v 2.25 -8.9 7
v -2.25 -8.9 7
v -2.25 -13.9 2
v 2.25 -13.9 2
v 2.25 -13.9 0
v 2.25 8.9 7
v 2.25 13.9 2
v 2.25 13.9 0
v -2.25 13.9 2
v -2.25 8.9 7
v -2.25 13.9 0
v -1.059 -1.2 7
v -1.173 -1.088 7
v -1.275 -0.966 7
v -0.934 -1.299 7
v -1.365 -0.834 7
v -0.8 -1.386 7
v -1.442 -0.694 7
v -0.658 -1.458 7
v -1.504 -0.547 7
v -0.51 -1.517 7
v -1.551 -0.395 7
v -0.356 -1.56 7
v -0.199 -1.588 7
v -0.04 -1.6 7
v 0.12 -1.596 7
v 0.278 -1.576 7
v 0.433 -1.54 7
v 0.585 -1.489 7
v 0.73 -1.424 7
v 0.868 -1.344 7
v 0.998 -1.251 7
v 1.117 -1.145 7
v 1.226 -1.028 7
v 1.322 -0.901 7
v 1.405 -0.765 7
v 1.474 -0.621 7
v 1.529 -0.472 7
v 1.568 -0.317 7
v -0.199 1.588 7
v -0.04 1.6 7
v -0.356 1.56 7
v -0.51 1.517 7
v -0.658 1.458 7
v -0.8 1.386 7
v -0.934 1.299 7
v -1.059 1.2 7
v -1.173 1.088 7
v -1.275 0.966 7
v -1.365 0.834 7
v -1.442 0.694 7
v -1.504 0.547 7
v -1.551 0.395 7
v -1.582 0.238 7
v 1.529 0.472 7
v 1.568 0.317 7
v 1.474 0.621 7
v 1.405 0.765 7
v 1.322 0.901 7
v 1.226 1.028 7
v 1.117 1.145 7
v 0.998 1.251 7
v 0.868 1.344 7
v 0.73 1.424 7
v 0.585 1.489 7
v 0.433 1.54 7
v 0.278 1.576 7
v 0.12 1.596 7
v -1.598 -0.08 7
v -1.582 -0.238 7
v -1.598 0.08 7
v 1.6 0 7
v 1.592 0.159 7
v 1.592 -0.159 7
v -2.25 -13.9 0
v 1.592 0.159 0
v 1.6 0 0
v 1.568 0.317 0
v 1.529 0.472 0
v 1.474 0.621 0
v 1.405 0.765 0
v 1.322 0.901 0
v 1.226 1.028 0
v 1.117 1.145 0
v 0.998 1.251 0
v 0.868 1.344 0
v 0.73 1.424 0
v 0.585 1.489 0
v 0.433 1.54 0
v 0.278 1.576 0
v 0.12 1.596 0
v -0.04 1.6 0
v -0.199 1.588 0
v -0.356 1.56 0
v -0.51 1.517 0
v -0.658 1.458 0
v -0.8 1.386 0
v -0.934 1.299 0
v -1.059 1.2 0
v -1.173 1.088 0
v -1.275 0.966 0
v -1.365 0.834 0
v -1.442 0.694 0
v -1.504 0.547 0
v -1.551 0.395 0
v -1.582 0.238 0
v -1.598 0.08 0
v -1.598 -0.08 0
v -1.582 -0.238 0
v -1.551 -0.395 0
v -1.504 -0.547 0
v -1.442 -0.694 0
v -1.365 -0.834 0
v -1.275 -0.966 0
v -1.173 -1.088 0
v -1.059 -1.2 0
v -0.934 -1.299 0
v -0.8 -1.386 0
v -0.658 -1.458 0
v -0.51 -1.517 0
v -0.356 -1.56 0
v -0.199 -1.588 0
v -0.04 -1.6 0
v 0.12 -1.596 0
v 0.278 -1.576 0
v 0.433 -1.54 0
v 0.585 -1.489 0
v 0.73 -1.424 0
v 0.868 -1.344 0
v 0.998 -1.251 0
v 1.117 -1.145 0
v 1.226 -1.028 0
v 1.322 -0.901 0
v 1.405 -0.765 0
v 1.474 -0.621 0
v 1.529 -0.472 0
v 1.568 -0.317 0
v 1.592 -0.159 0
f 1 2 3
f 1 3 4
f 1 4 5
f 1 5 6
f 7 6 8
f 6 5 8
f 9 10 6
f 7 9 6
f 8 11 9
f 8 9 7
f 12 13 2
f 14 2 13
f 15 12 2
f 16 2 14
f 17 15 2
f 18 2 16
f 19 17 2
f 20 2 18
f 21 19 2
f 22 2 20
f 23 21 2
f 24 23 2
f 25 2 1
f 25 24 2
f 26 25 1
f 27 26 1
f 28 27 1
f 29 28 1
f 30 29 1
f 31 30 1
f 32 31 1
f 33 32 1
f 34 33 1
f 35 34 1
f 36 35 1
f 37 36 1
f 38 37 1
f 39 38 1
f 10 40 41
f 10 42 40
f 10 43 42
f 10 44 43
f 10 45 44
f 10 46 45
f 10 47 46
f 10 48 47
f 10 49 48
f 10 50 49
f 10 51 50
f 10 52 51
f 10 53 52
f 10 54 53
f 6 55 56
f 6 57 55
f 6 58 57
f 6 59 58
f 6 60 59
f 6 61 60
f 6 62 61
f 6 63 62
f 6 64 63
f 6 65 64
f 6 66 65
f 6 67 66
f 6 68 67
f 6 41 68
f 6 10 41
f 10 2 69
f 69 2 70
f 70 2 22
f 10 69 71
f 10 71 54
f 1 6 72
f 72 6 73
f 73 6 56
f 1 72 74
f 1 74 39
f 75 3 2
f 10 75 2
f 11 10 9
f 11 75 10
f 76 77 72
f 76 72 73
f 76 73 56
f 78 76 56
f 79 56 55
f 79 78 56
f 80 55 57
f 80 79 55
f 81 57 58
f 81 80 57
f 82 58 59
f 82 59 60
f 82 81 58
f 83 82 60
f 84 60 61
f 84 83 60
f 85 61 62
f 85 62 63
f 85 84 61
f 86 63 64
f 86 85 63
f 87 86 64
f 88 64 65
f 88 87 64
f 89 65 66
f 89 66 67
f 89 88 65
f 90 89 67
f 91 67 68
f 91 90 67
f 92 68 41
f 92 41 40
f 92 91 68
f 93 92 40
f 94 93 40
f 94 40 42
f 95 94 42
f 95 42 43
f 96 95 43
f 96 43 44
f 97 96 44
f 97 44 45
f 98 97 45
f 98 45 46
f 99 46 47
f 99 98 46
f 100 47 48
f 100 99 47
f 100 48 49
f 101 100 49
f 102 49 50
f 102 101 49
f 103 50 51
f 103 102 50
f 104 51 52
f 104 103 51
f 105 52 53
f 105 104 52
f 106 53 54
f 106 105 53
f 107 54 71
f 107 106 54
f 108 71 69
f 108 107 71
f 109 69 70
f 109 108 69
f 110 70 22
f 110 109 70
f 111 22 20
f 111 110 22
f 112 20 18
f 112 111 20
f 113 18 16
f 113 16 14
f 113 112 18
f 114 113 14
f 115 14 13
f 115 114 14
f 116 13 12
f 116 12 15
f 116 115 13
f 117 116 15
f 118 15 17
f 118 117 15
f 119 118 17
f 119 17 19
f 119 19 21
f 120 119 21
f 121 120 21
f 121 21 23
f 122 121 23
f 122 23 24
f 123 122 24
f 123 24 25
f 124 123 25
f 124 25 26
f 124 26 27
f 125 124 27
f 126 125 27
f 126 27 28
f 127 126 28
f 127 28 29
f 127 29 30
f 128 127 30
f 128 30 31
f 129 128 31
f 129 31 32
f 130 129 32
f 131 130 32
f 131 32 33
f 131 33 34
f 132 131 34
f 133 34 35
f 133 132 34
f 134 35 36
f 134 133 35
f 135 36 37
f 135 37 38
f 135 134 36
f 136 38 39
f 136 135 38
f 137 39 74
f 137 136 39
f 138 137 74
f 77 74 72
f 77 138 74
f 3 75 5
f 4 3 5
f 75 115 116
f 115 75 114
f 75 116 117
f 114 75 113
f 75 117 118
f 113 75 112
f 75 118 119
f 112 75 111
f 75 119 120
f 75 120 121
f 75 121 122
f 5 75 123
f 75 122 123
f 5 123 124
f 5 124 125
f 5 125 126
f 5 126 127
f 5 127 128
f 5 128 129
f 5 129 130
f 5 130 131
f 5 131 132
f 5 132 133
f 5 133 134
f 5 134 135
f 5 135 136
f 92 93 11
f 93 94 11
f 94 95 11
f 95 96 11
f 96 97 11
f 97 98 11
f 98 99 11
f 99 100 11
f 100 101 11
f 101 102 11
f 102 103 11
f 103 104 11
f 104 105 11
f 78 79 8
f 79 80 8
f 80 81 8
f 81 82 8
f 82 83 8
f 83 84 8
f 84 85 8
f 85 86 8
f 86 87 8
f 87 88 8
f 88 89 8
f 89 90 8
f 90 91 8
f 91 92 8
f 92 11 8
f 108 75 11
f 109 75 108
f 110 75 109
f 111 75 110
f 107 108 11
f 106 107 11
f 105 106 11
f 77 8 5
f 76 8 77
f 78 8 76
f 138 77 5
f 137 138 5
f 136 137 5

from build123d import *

# Parameters (mm, degrees)
F0_W     = 4.5
F0_H     = 27.8
F0_R     = 1.6
F1_DEPTH = 7
F2_SIZE  = 5


with BuildPart() as f1:
    # F0 (on Top) → F1 (new body)
    with BuildSketch(Plane.XY):
        Rectangle(F0_W, F0_H)
        Circle(F0_R, mode=Mode.SUBTRACT)
    extrude(amount=F1_DEPTH)

    # F2
    f2_edges = [f1.edges().sort_by_distance(p)[0] for p in [
        (0, -13.9, 7),
        (0, 13.9, 7),
    ]]
    chamfer(f2_edges, length=F2_SIZE)


solid = f1.part
